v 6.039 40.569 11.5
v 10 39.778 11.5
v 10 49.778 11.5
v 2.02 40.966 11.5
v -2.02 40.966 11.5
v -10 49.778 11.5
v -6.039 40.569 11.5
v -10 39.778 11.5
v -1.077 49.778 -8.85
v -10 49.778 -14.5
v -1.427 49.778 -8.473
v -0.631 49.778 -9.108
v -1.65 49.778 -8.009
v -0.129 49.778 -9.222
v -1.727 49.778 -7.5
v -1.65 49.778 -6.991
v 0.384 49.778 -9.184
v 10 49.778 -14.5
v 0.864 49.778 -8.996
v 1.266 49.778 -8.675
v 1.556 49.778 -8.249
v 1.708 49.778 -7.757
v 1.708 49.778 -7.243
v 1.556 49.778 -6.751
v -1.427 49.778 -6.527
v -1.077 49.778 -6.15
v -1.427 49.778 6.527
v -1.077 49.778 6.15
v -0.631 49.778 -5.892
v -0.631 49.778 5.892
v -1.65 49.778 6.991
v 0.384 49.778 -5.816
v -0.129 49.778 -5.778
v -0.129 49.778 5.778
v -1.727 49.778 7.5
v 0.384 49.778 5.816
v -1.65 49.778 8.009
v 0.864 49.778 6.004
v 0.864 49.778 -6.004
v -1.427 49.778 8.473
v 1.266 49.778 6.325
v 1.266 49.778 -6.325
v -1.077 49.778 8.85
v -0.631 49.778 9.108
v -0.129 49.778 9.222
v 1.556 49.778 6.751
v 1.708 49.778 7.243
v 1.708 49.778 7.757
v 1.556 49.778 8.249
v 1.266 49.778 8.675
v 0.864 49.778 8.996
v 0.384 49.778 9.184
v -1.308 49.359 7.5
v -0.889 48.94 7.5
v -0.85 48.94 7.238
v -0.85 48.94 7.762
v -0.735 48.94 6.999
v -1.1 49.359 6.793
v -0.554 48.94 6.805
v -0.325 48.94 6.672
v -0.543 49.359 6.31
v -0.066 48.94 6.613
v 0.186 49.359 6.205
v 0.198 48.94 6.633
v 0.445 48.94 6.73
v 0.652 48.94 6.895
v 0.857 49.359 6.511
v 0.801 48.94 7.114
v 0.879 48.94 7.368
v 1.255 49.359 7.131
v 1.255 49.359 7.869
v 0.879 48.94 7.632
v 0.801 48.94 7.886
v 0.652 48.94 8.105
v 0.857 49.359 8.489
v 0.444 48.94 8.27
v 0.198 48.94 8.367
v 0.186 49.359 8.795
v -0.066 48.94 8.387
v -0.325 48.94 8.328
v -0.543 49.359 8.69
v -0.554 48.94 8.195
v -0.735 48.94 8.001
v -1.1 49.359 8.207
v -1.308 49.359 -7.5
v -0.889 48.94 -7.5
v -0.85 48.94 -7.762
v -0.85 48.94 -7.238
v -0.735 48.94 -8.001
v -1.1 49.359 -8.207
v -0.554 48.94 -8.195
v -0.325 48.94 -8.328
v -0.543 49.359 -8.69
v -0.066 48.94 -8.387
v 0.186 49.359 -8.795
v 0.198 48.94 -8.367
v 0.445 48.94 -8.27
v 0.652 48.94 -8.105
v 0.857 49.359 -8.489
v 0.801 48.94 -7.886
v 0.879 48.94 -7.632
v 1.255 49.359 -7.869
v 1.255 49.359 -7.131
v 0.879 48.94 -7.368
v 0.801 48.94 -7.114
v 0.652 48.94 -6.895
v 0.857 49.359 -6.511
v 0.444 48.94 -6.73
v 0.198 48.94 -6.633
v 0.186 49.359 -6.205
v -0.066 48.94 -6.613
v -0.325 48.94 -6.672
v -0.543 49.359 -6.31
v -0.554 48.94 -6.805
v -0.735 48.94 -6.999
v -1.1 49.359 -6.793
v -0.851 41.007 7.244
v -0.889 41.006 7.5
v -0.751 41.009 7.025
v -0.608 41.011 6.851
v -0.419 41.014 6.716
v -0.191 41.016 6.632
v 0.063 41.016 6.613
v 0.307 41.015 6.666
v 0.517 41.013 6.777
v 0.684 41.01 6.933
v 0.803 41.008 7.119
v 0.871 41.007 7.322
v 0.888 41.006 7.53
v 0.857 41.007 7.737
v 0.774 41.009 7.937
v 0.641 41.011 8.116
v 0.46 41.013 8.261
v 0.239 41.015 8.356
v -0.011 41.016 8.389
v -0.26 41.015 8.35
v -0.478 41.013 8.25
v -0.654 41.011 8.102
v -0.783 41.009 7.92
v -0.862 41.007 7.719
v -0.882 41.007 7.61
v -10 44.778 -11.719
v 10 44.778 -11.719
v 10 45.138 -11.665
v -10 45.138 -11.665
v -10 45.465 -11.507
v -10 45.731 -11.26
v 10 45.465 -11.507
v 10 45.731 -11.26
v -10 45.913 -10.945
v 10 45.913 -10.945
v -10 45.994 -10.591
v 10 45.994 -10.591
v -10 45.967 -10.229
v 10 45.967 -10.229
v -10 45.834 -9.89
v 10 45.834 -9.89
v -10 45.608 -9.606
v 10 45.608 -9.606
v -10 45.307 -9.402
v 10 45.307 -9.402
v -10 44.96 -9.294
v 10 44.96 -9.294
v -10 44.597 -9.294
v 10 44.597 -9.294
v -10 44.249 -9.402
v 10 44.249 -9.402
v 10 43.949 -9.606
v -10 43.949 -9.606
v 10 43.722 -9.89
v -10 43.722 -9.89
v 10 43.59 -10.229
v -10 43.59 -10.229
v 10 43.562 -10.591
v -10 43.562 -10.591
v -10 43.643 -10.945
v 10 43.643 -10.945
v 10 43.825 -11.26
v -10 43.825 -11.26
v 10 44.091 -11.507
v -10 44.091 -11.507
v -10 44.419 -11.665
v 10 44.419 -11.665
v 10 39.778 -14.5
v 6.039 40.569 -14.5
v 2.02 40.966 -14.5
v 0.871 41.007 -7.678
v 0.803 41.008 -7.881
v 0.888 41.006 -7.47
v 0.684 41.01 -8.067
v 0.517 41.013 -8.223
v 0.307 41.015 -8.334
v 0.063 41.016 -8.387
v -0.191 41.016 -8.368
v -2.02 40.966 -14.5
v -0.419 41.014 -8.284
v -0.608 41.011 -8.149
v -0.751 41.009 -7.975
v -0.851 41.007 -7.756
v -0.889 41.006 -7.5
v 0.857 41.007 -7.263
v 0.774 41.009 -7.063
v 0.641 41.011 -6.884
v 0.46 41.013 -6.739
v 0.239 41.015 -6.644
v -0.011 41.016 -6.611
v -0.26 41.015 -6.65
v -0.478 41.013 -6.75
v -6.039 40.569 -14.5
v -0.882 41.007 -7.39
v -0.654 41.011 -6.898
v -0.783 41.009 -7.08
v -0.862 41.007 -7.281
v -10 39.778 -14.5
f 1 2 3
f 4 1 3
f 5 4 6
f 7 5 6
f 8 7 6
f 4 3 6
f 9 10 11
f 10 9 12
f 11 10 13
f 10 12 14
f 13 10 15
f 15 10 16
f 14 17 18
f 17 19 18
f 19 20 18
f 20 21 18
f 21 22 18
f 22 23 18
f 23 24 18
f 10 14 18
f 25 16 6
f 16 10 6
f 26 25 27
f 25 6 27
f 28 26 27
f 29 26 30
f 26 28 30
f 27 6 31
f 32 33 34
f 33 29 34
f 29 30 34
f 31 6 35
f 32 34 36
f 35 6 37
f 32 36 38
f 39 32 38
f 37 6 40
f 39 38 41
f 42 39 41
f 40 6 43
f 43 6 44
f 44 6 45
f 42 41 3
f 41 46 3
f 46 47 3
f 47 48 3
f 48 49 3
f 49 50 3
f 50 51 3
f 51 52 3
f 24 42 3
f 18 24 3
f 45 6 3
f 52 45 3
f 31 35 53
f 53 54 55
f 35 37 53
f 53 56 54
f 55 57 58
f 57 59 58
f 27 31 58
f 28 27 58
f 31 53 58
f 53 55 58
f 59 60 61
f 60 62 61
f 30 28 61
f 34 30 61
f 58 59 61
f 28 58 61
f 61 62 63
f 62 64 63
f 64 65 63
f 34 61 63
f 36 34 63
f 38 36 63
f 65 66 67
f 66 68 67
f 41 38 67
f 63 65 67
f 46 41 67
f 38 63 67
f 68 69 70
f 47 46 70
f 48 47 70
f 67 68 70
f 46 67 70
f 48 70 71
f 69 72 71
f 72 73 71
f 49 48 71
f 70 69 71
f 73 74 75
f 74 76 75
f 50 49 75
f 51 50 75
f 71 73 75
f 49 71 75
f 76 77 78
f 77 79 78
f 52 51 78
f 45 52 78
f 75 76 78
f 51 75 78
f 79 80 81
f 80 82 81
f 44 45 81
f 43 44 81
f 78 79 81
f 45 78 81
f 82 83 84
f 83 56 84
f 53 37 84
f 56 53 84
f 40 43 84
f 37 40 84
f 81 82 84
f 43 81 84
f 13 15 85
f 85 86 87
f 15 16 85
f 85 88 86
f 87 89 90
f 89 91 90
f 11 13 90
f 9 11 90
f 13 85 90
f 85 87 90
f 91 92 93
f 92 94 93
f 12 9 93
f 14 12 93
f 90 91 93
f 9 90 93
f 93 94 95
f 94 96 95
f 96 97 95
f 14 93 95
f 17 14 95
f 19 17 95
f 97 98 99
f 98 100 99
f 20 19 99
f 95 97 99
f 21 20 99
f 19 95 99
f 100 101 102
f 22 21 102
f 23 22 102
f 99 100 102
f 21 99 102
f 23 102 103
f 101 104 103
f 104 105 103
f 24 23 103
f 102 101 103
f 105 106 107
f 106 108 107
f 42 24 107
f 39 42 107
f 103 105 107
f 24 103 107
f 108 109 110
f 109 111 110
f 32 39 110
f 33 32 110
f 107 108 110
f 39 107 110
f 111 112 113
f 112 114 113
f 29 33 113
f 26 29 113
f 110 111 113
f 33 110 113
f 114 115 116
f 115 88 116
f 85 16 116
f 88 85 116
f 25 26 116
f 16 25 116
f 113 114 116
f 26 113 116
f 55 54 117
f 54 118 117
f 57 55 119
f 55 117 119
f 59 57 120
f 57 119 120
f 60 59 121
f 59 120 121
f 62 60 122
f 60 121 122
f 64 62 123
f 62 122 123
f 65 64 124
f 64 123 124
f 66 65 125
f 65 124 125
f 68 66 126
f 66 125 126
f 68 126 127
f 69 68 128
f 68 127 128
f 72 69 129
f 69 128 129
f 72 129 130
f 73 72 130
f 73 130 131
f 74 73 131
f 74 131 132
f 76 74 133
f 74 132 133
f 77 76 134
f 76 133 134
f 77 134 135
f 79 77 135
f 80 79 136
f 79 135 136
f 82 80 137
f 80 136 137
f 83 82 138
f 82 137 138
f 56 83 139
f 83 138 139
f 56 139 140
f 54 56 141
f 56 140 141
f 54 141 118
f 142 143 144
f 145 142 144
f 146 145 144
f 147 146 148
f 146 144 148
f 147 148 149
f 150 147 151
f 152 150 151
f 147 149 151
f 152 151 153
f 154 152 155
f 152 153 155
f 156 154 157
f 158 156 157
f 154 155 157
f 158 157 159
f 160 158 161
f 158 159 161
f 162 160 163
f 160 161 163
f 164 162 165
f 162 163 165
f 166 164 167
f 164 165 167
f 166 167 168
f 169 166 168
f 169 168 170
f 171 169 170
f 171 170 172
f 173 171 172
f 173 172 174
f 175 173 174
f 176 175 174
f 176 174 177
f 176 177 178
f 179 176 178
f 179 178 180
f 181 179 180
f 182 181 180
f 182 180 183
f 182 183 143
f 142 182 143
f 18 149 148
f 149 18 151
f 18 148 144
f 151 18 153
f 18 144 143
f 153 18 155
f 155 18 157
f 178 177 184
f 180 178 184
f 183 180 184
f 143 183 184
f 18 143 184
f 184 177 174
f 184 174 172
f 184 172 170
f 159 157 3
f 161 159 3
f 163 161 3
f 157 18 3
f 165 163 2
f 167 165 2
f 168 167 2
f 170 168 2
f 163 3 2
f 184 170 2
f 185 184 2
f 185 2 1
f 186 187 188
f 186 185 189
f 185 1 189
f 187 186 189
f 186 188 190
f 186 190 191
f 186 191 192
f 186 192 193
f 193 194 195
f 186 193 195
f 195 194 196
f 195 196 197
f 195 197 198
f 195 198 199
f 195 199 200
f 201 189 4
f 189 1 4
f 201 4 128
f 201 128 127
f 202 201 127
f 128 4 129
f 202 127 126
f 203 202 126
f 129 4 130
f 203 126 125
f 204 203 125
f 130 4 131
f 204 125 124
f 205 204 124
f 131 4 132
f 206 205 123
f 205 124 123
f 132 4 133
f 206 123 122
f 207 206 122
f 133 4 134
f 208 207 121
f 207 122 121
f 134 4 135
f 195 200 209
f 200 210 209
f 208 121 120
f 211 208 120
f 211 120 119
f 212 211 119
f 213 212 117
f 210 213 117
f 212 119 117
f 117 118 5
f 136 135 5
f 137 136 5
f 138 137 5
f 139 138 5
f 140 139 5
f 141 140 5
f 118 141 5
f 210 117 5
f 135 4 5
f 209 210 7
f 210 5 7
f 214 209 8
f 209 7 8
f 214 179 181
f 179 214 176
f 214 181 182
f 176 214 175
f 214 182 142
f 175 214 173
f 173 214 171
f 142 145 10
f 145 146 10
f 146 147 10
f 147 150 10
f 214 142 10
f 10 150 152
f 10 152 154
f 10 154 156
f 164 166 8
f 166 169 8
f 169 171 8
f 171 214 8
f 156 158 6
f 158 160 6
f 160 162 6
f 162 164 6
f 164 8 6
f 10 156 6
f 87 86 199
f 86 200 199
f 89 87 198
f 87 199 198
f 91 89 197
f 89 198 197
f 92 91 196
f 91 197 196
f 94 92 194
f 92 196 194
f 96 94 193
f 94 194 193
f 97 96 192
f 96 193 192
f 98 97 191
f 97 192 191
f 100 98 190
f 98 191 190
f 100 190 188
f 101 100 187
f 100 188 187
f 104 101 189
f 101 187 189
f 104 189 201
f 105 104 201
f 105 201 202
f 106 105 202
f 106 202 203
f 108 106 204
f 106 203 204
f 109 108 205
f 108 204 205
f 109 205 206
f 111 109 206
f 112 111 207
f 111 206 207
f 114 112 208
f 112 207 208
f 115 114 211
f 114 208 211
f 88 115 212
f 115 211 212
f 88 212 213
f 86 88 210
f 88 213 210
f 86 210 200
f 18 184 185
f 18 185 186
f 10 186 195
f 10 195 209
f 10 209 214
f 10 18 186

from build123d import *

# Parameters (mm, degrees)
BOSS_EXTRUDE1_DEPTH             = 11.5
F_2_56_TAPPED_HOLE3_D           = 1.778
F_2_56_TAPPED_HOLE3_CSINK_D     = 3.4544
F_2_56_TAPPED_HOLE3_CSINK_ANGLE = 90
BOSS_EXTRUDE2_DEPTH             = 3
F_2_CLEARANCE_HOLE1_D           = 2.4384


with BuildPart() as part:
    # Sketch1 → Boss-Extrude1 (new body, symmetric)
    with BuildSketch(Plane.XY):
        with BuildLine():
            Line((-10, 39.778288752), (-10, 49.778288752))
            Line((-10, 49.778288752), (10, 49.778288752))
            Line((10, 49.778288752), (10, 39.778288752))
            ThreePointArc((10, 39.778288752), (0, 41.016), (-10, 39.778288752))
        make_face()
    extrude(amount=BOSS_EXTRUDE1_DEPTH, both=True)

    # #2-56 Tapped Hole3 (through all)
    with Locations(Plane(origin=(0, 49.778288752, 0), x_dir=(1, 0, 0), z_dir=(0, 1, 0))):
        with Locations((0, -7.5), (0, 7.5)):
            CounterSinkHole(F_2_56_TAPPED_HOLE3_D / 2, F_2_56_TAPPED_HOLE3_CSINK_D / 2, counter_sink_angle=F_2_56_TAPPED_HOLE3_CSINK_ANGLE)

    # Sketch5 → Boss-Extrude2 (add)
    with BuildSketch(Plane(origin=(0, 0, -11.5), x_dir=(-1, 0, 0), z_dir=(0, 0, -1))):
        with BuildLine():
            Line((10, 49.778288752), (-10, 49.778288752))
            Line((-10, 49.778288752), (-10, 39.778288752))
            ThreePointArc((-10, 39.778288752), (0, 41.016), (10, 39.778288752))
            Line((10, 39.778288752), (10, 49.778288752))
        make_face()
    extrude(amount=BOSS_EXTRUDE2_DEPTH)

    # #2 Clearance Hole1 (through all)
    with Locations(Plane.ZY.offset(10)):
        with Locations((-10.5, 44.778288752)):
            Hole(F_2_CLEARANCE_HOLE1_D / 2)


solid = part.part
